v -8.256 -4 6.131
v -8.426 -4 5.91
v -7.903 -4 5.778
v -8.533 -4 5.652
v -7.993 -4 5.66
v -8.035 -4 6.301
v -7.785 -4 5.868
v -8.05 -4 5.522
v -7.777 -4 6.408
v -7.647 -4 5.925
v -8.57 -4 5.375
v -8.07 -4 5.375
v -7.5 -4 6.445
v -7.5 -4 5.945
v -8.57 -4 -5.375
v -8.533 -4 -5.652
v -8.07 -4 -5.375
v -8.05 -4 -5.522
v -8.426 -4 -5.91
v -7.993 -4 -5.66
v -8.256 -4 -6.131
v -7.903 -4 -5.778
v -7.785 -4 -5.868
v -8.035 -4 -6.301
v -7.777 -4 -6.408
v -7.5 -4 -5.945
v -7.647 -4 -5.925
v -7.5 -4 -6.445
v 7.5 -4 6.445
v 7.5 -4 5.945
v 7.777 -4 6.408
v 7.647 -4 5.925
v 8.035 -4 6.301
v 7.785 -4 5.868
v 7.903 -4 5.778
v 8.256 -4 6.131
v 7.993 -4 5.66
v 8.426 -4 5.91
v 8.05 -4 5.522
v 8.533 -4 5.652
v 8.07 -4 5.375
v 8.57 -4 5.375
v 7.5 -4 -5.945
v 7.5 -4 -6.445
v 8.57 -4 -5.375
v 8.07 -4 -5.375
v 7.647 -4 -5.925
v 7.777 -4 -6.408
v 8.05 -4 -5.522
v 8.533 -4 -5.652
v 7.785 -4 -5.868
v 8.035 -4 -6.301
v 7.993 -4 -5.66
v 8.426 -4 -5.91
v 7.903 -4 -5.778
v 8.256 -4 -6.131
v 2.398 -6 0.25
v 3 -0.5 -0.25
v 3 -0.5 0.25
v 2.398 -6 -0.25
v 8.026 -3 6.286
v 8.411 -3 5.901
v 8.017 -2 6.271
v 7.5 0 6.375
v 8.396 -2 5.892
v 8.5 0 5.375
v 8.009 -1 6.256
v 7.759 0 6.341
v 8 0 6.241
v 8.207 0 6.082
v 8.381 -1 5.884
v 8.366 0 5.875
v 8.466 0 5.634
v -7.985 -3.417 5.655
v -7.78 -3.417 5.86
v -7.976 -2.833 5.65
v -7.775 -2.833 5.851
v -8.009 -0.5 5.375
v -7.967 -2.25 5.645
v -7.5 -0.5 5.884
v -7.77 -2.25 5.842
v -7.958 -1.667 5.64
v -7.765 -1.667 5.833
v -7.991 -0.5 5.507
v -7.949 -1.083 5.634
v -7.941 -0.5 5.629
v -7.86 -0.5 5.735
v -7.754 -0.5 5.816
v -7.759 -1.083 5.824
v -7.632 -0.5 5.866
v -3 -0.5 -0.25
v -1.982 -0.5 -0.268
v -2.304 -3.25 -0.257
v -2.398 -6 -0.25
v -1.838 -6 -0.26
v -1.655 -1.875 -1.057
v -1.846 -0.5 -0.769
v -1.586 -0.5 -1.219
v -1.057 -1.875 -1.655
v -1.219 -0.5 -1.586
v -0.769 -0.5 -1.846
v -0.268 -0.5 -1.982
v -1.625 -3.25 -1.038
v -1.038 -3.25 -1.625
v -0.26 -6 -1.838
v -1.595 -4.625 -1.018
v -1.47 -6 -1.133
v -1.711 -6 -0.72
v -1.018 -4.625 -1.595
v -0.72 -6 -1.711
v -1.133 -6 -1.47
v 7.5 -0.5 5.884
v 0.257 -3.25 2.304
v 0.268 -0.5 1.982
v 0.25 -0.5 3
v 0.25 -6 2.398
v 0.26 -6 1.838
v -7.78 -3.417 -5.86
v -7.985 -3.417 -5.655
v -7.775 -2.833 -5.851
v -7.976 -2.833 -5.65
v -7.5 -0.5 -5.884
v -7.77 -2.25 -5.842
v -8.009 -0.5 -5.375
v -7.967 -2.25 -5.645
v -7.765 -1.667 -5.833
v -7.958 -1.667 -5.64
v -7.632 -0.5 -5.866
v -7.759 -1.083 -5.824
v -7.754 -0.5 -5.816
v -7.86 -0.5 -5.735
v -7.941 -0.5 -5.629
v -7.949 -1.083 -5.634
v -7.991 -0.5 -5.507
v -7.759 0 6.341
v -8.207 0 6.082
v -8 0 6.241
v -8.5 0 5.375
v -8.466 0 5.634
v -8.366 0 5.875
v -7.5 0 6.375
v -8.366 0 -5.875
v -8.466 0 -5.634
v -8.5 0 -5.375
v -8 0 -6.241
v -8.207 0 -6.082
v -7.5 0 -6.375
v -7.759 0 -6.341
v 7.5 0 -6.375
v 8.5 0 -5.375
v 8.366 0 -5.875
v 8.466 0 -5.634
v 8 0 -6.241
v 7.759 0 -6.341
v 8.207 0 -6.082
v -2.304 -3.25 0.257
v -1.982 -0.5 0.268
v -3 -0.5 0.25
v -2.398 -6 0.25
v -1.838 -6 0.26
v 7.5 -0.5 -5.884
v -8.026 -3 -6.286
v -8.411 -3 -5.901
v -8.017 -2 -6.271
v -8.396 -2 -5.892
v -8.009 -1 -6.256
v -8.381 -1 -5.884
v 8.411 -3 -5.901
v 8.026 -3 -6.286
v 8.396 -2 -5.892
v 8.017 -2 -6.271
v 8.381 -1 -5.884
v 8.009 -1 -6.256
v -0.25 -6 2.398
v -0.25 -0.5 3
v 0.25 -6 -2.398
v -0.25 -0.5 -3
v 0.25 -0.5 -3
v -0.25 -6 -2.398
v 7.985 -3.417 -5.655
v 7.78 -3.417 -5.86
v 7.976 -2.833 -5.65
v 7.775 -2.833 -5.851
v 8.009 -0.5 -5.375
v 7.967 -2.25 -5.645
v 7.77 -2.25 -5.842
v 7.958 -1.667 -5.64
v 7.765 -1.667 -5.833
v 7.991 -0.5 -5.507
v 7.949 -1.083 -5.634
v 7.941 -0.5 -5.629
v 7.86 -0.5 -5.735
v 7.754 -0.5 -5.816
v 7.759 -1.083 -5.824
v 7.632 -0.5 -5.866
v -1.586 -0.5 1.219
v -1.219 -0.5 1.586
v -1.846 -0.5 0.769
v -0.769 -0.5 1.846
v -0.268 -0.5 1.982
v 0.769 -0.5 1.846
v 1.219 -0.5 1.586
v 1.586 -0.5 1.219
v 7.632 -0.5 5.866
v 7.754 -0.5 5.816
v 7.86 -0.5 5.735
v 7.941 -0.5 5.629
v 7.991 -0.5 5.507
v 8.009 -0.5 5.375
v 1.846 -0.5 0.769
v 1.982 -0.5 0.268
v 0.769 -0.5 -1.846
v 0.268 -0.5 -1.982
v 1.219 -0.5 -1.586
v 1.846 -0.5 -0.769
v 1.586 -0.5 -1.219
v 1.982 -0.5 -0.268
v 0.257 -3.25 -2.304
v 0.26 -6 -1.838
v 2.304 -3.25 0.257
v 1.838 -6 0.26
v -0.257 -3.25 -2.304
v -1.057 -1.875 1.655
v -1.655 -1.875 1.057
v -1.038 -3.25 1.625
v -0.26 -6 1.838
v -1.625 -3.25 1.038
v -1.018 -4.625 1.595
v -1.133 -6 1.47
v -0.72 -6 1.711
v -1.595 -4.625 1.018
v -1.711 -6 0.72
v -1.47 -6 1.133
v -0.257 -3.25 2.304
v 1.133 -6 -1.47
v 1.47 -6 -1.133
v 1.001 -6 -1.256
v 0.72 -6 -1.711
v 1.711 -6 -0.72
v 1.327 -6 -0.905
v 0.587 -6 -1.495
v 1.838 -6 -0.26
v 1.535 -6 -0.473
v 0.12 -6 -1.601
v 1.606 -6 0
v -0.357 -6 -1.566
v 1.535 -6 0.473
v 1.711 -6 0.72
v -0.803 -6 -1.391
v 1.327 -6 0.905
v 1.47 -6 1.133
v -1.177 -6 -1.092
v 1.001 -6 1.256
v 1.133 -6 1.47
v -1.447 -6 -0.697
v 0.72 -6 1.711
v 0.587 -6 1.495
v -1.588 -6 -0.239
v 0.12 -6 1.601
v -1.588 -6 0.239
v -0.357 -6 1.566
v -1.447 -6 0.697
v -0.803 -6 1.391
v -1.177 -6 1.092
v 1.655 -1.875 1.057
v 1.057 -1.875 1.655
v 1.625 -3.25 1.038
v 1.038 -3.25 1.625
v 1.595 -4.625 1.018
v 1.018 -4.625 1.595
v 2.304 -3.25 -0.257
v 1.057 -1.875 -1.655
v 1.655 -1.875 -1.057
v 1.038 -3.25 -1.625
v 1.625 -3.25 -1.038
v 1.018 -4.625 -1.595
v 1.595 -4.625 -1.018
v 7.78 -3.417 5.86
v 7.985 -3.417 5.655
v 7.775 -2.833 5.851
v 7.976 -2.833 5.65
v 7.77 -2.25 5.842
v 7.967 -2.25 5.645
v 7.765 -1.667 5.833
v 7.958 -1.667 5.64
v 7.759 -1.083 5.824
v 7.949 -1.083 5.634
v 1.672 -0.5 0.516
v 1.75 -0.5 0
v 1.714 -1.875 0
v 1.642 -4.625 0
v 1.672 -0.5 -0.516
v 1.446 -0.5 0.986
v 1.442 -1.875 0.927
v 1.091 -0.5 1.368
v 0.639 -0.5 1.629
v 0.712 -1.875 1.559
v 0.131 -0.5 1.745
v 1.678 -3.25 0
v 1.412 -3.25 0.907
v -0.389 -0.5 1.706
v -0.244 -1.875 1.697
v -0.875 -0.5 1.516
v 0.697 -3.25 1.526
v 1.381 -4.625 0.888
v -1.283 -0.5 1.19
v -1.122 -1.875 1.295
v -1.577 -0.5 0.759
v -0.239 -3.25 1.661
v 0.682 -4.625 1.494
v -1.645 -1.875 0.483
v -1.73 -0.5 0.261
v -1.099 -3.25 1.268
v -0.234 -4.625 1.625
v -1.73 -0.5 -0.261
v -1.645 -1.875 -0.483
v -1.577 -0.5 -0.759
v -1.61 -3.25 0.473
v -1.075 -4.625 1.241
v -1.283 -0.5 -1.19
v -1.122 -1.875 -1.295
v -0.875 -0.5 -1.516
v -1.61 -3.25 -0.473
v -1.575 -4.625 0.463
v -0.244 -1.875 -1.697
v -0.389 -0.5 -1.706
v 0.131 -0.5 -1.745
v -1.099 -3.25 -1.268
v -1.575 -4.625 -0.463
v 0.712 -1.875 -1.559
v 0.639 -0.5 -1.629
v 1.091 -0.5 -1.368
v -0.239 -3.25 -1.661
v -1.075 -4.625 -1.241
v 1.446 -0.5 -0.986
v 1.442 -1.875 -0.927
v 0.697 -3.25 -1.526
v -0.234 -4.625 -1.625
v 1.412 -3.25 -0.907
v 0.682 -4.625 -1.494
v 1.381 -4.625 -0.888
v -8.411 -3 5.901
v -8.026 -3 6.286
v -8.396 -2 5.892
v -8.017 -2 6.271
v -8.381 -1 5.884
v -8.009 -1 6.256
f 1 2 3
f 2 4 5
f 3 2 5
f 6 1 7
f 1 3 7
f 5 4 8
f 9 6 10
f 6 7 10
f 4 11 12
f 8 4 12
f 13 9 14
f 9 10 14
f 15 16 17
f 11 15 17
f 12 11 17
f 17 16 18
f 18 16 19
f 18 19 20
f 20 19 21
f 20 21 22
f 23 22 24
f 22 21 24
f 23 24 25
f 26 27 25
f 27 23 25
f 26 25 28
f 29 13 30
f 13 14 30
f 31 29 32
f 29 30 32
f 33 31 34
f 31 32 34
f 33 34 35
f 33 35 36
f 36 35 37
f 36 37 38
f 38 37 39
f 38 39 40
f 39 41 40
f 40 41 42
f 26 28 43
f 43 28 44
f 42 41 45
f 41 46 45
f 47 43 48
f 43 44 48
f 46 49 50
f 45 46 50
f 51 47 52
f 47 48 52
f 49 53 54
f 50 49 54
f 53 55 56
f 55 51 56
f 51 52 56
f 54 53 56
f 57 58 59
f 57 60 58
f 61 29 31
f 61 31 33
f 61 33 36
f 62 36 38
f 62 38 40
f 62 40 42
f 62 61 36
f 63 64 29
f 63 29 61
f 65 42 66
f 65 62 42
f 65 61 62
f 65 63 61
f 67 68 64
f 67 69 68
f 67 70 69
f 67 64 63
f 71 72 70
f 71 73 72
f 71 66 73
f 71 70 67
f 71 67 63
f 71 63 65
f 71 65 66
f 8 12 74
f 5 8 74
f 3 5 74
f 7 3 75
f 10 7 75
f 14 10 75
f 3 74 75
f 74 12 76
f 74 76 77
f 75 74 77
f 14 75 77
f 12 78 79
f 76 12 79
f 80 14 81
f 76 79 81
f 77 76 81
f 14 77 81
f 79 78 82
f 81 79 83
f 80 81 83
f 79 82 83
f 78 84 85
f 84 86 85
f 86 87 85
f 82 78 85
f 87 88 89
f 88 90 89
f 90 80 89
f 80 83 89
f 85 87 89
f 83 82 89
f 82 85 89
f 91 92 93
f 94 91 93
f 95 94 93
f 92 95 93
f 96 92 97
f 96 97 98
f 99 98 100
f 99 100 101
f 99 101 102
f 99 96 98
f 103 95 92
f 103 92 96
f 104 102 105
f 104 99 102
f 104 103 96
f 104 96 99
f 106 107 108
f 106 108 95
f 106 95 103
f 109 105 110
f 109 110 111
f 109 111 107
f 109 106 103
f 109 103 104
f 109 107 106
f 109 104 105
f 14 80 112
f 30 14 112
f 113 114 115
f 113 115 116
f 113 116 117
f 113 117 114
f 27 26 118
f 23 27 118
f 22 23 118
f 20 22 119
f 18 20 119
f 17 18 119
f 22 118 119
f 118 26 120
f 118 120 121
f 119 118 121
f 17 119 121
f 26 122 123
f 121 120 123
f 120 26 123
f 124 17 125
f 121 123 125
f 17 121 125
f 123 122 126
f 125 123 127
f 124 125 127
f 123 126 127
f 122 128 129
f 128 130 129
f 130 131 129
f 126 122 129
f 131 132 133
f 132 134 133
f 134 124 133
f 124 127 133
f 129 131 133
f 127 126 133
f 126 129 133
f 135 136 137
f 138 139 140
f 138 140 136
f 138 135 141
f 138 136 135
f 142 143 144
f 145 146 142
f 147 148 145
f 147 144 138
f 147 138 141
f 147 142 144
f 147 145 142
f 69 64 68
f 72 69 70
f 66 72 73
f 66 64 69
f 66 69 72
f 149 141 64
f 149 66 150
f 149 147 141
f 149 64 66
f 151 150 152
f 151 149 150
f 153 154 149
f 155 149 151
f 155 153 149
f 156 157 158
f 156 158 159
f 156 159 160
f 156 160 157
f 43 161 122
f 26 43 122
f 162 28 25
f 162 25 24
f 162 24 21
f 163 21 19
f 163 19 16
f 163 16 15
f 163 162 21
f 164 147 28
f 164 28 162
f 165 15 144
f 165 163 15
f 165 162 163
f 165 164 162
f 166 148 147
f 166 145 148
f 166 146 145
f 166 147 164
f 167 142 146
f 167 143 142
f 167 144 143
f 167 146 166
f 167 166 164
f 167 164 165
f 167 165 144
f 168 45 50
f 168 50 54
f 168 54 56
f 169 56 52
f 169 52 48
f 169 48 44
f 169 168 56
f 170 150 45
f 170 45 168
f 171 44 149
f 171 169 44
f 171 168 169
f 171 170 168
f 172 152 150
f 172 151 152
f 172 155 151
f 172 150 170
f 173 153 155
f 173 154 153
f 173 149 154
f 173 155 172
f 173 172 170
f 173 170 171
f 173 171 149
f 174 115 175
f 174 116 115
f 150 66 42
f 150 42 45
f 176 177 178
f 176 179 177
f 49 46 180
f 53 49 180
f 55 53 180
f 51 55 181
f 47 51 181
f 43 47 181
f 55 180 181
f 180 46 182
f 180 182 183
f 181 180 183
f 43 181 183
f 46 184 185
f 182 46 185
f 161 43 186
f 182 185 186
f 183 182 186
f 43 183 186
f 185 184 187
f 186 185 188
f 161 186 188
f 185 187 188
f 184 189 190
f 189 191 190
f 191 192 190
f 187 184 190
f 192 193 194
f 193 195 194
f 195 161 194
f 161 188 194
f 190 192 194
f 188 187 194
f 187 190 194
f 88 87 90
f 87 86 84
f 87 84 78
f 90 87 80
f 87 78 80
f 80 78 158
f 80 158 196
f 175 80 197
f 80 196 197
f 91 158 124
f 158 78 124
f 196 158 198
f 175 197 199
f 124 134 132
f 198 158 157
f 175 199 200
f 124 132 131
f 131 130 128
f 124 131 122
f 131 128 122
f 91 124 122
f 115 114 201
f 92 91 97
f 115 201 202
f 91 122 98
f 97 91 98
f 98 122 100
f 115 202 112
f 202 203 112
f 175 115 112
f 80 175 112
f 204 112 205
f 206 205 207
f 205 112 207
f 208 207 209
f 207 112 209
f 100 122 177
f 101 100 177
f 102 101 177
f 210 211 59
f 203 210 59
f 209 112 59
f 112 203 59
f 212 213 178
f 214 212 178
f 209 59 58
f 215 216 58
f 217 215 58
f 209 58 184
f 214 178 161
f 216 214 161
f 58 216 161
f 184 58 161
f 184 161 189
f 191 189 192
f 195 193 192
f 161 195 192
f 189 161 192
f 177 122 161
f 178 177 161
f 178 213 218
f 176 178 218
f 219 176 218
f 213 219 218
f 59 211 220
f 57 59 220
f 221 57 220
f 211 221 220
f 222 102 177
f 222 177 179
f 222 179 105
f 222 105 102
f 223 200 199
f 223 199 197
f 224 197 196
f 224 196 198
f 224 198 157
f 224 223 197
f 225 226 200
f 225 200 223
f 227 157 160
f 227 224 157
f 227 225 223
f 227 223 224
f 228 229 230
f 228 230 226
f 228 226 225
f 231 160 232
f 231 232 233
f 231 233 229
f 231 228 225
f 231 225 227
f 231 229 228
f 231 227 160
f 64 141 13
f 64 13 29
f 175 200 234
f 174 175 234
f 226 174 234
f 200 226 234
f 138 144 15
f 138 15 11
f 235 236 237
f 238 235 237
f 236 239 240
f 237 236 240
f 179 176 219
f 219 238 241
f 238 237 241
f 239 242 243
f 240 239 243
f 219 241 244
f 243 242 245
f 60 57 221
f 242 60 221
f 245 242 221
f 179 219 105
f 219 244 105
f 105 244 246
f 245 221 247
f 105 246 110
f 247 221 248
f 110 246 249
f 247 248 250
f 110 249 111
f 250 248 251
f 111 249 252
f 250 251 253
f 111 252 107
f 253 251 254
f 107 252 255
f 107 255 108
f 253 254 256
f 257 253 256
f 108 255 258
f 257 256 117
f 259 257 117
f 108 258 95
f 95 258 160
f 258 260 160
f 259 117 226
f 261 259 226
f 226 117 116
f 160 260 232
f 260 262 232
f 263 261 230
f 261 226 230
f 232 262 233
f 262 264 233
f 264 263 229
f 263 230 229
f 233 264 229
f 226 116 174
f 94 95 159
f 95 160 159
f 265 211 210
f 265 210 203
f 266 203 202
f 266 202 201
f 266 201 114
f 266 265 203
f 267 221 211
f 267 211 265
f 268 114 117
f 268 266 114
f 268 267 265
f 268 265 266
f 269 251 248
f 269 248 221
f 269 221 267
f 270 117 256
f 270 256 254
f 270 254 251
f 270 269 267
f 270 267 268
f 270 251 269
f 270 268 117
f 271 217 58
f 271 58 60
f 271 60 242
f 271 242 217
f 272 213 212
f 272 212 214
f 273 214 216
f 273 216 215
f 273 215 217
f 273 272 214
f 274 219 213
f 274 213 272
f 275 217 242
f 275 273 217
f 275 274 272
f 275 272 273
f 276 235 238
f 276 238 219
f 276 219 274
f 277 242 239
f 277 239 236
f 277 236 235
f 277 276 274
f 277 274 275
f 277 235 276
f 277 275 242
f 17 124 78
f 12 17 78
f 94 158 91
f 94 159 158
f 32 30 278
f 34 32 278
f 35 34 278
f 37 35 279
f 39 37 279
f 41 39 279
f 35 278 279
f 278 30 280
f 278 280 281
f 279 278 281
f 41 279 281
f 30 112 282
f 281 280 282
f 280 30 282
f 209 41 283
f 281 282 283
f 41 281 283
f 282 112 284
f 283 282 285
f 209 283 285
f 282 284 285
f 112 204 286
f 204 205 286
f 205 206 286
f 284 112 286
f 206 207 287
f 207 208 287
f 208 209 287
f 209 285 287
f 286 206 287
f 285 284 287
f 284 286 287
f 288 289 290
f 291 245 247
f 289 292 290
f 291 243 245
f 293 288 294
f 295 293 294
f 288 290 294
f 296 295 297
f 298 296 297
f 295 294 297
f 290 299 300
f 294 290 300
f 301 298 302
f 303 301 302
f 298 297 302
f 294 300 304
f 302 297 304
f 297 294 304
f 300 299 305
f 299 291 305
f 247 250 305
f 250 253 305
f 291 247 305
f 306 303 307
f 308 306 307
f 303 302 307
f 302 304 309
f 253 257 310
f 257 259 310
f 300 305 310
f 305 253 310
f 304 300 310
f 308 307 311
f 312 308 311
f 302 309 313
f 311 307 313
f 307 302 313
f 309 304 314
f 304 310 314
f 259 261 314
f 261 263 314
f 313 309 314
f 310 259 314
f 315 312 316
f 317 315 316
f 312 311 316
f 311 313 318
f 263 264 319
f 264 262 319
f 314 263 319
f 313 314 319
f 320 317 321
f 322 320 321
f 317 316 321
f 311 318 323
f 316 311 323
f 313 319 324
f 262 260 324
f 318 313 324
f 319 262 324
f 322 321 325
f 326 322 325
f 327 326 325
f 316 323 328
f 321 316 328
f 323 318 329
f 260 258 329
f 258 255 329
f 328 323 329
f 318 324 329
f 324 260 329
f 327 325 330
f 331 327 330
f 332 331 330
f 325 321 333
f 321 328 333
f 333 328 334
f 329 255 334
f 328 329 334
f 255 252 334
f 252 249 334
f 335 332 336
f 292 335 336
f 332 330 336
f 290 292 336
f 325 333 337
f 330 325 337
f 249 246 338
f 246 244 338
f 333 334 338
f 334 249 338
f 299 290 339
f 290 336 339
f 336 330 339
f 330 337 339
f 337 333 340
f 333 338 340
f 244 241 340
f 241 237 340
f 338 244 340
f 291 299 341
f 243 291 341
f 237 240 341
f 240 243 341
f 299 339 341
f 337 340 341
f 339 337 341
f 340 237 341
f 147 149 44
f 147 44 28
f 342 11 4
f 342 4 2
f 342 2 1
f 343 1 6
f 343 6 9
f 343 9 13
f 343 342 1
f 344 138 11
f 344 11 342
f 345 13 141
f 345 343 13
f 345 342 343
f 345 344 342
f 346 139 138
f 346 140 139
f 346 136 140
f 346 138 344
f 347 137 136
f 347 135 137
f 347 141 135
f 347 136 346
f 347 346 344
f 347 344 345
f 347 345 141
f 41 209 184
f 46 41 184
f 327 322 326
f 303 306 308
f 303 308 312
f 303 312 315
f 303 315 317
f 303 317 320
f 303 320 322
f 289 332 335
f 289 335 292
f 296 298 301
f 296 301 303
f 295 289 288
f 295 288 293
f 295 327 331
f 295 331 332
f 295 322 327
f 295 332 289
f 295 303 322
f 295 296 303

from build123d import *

# Parameters (mm, degrees)
BOSS_EXTRUDE1_DEPTH = 4
BOSS_EXTRUDE1_DRAFT = 1
SHELL1_T            = -0.5
SKETCH2_R           = 2
BOSS_EXTRUDE2_DEPTH = 5.5
BOSS_EXTRUDE2_TAPER = 1.5
CIRPATTERN1_COUNT   = 4
SKETCH4_R           = 1.605977431
CUT_EXTRUDE1_DEPTH  = 5.5
CUT_EXTRUDE1_DRAFT  = 1.5


with BuildPart() as part:
    # Sketch1 → Boss-Extrude1 (with draft: the straight prism first)
    with BuildSketch(Plane(origin=(0, 0, 0), x_dir=(1, 0, 0), z_dir=(0, 1, 0))):
        with BuildLine():
            Line((-7.5, -6.375), (7.5, -6.375))
            ThreePointArc((7.5, -6.375), (8.207106781, -6.082106781), (8.5, -5.375))
            Line((8.5, -5.375), (8.5, 5.375))
            ThreePointArc((8.5, 5.375), (8.207106781, 6.082106781), (7.5, 6.375))
            Line((7.5, 6.375), (-7.5, 6.375))
            ThreePointArc((-7.5, 6.375), (-8.207106781, 6.082106781), (-8.5, 5.375))
            Line((-8.5, 5.375), (-8.5, -5.375))
            ThreePointArc((-8.5, -5.375), (-8.207106781, -6.082106781), (-7.5, -6.375))
        make_face()
    extrude(amount=-BOSS_EXTRUDE1_DEPTH)
    # Boss-Extrude1: the draft: its side faces are tilted about the plane it starts from
    boss_extrude1_sides = [part.faces().sort_by_distance(p)[0] for p in [
        (0, -2, 6.375),
        (8.207106781, -2, 6.082106781),
        (8.5, -2, 0),
        (8.207106781, -2, -6.082106781),
        (0, -2, -6.375),
        (-8.207106781, -2, -6.082106781),
        (-8.5, -2, 0),
        (-8.207106781, -2, 6.082106781),
    ]]
    draft(boss_extrude1_sides, Plane(origin=(0, 0, 0), x_dir=(1, 0, 0), z_dir=(0, 1, 0)), BOSS_EXTRUDE1_DRAFT)

    # Shell1
    shell1_openings = [part.faces().sort_by_distance(p)[0] for p in [
        (0, -4, 0),
    ]]
    offset(amount=SHELL1_T, openings=shell1_openings, kind=Kind.INTERSECTION)

    # Sketch2 → Boss-Extrude2 (add)
    with BuildSketch(Plane.XZ.offset(0.5)):
        Circle(SKETCH2_R)
    extrude(amount=BOSS_EXTRUDE2_DEPTH, taper=BOSS_EXTRUDE2_TAPER)

    # Rib1: read off the stored shape, not the designer's step
    # Rib1: loft between two sections, ruled curve by curve
    rib1_from = [
        Edge.make_line((1.982008139, -0.5, 0.267663478), (3, -0.5, 0.25)),
        Edge.make_line((1.982008139, -0.5, -0.267663478), (3, -0.5, -0.25)),
        Edge.make_line((3, -0.5, -0.25), (3, -0.5, 0.25)),
        Edge.make_line((1.982008139, -0.5, -0.267663478), (1.982008139, -0.5, 0.267663478)),
    ]
    rib1_to = [
        Edge.make_line((1.837716138, -6, 0.259714502), (2.397587968, -6, 0.25)),
        Edge.make_line((1.837716138, -6, -0.259714502), (2.397587968, -6, -0.25)),
        Edge.make_line((2.397587968, -6, -0.25), (2.397587968, -6, 0.25)),
        Edge.make_line((1.837716138, -6, -0.259714502), (1.837716138, -6, 0.259714502)),
    ]
    rib1 = Solid(Shell([*[Face.make_surface_from_curves(rib1_from[k], rib1_to[k]) for k in range(4)], Face(Wire(rib1_from)), Face(Wire(rib1_to))]))
    add(rib1)

    # CirPattern1: Rib1 ×4 about axis
    cirpattern1_axis = Axis((0, 0, 0), (0, 1, 0))
    for i in range(1, CIRPATTERN1_COUNT):
        add(rib1.rotate(cirpattern1_axis, i * 360 / CIRPATTERN1_COUNT))


with BuildPart() as cut_extrude1_tool:
    # Sketch4 → Cut-Extrude1 (with draft: the straight prism first)
    with BuildSketch(Plane.XZ.offset(6)):
        Circle(SKETCH4_R)
    extrude(amount=-CUT_EXTRUDE1_DEPTH)
    # Cut-Extrude1: the draft: its side faces are tilted about the plane it starts from
    cut_extrude1_sides = [cut_extrude1_tool.faces().sort_by_distance(p)[0] for p in [
        (-1.605977431, -3.25, 0),
    ]]
    draft(cut_extrude1_sides, Plane.XZ.offset(6), CUT_EXTRUDE1_DRAFT)


with BuildPart() as part_1:
    add(part.part)

    # Cut-Extrude1: cut by cut_extrude1_tool
    add(cut_extrude1_tool.part, mode=Mode.SUBTRACT)


solid = part_1.part
